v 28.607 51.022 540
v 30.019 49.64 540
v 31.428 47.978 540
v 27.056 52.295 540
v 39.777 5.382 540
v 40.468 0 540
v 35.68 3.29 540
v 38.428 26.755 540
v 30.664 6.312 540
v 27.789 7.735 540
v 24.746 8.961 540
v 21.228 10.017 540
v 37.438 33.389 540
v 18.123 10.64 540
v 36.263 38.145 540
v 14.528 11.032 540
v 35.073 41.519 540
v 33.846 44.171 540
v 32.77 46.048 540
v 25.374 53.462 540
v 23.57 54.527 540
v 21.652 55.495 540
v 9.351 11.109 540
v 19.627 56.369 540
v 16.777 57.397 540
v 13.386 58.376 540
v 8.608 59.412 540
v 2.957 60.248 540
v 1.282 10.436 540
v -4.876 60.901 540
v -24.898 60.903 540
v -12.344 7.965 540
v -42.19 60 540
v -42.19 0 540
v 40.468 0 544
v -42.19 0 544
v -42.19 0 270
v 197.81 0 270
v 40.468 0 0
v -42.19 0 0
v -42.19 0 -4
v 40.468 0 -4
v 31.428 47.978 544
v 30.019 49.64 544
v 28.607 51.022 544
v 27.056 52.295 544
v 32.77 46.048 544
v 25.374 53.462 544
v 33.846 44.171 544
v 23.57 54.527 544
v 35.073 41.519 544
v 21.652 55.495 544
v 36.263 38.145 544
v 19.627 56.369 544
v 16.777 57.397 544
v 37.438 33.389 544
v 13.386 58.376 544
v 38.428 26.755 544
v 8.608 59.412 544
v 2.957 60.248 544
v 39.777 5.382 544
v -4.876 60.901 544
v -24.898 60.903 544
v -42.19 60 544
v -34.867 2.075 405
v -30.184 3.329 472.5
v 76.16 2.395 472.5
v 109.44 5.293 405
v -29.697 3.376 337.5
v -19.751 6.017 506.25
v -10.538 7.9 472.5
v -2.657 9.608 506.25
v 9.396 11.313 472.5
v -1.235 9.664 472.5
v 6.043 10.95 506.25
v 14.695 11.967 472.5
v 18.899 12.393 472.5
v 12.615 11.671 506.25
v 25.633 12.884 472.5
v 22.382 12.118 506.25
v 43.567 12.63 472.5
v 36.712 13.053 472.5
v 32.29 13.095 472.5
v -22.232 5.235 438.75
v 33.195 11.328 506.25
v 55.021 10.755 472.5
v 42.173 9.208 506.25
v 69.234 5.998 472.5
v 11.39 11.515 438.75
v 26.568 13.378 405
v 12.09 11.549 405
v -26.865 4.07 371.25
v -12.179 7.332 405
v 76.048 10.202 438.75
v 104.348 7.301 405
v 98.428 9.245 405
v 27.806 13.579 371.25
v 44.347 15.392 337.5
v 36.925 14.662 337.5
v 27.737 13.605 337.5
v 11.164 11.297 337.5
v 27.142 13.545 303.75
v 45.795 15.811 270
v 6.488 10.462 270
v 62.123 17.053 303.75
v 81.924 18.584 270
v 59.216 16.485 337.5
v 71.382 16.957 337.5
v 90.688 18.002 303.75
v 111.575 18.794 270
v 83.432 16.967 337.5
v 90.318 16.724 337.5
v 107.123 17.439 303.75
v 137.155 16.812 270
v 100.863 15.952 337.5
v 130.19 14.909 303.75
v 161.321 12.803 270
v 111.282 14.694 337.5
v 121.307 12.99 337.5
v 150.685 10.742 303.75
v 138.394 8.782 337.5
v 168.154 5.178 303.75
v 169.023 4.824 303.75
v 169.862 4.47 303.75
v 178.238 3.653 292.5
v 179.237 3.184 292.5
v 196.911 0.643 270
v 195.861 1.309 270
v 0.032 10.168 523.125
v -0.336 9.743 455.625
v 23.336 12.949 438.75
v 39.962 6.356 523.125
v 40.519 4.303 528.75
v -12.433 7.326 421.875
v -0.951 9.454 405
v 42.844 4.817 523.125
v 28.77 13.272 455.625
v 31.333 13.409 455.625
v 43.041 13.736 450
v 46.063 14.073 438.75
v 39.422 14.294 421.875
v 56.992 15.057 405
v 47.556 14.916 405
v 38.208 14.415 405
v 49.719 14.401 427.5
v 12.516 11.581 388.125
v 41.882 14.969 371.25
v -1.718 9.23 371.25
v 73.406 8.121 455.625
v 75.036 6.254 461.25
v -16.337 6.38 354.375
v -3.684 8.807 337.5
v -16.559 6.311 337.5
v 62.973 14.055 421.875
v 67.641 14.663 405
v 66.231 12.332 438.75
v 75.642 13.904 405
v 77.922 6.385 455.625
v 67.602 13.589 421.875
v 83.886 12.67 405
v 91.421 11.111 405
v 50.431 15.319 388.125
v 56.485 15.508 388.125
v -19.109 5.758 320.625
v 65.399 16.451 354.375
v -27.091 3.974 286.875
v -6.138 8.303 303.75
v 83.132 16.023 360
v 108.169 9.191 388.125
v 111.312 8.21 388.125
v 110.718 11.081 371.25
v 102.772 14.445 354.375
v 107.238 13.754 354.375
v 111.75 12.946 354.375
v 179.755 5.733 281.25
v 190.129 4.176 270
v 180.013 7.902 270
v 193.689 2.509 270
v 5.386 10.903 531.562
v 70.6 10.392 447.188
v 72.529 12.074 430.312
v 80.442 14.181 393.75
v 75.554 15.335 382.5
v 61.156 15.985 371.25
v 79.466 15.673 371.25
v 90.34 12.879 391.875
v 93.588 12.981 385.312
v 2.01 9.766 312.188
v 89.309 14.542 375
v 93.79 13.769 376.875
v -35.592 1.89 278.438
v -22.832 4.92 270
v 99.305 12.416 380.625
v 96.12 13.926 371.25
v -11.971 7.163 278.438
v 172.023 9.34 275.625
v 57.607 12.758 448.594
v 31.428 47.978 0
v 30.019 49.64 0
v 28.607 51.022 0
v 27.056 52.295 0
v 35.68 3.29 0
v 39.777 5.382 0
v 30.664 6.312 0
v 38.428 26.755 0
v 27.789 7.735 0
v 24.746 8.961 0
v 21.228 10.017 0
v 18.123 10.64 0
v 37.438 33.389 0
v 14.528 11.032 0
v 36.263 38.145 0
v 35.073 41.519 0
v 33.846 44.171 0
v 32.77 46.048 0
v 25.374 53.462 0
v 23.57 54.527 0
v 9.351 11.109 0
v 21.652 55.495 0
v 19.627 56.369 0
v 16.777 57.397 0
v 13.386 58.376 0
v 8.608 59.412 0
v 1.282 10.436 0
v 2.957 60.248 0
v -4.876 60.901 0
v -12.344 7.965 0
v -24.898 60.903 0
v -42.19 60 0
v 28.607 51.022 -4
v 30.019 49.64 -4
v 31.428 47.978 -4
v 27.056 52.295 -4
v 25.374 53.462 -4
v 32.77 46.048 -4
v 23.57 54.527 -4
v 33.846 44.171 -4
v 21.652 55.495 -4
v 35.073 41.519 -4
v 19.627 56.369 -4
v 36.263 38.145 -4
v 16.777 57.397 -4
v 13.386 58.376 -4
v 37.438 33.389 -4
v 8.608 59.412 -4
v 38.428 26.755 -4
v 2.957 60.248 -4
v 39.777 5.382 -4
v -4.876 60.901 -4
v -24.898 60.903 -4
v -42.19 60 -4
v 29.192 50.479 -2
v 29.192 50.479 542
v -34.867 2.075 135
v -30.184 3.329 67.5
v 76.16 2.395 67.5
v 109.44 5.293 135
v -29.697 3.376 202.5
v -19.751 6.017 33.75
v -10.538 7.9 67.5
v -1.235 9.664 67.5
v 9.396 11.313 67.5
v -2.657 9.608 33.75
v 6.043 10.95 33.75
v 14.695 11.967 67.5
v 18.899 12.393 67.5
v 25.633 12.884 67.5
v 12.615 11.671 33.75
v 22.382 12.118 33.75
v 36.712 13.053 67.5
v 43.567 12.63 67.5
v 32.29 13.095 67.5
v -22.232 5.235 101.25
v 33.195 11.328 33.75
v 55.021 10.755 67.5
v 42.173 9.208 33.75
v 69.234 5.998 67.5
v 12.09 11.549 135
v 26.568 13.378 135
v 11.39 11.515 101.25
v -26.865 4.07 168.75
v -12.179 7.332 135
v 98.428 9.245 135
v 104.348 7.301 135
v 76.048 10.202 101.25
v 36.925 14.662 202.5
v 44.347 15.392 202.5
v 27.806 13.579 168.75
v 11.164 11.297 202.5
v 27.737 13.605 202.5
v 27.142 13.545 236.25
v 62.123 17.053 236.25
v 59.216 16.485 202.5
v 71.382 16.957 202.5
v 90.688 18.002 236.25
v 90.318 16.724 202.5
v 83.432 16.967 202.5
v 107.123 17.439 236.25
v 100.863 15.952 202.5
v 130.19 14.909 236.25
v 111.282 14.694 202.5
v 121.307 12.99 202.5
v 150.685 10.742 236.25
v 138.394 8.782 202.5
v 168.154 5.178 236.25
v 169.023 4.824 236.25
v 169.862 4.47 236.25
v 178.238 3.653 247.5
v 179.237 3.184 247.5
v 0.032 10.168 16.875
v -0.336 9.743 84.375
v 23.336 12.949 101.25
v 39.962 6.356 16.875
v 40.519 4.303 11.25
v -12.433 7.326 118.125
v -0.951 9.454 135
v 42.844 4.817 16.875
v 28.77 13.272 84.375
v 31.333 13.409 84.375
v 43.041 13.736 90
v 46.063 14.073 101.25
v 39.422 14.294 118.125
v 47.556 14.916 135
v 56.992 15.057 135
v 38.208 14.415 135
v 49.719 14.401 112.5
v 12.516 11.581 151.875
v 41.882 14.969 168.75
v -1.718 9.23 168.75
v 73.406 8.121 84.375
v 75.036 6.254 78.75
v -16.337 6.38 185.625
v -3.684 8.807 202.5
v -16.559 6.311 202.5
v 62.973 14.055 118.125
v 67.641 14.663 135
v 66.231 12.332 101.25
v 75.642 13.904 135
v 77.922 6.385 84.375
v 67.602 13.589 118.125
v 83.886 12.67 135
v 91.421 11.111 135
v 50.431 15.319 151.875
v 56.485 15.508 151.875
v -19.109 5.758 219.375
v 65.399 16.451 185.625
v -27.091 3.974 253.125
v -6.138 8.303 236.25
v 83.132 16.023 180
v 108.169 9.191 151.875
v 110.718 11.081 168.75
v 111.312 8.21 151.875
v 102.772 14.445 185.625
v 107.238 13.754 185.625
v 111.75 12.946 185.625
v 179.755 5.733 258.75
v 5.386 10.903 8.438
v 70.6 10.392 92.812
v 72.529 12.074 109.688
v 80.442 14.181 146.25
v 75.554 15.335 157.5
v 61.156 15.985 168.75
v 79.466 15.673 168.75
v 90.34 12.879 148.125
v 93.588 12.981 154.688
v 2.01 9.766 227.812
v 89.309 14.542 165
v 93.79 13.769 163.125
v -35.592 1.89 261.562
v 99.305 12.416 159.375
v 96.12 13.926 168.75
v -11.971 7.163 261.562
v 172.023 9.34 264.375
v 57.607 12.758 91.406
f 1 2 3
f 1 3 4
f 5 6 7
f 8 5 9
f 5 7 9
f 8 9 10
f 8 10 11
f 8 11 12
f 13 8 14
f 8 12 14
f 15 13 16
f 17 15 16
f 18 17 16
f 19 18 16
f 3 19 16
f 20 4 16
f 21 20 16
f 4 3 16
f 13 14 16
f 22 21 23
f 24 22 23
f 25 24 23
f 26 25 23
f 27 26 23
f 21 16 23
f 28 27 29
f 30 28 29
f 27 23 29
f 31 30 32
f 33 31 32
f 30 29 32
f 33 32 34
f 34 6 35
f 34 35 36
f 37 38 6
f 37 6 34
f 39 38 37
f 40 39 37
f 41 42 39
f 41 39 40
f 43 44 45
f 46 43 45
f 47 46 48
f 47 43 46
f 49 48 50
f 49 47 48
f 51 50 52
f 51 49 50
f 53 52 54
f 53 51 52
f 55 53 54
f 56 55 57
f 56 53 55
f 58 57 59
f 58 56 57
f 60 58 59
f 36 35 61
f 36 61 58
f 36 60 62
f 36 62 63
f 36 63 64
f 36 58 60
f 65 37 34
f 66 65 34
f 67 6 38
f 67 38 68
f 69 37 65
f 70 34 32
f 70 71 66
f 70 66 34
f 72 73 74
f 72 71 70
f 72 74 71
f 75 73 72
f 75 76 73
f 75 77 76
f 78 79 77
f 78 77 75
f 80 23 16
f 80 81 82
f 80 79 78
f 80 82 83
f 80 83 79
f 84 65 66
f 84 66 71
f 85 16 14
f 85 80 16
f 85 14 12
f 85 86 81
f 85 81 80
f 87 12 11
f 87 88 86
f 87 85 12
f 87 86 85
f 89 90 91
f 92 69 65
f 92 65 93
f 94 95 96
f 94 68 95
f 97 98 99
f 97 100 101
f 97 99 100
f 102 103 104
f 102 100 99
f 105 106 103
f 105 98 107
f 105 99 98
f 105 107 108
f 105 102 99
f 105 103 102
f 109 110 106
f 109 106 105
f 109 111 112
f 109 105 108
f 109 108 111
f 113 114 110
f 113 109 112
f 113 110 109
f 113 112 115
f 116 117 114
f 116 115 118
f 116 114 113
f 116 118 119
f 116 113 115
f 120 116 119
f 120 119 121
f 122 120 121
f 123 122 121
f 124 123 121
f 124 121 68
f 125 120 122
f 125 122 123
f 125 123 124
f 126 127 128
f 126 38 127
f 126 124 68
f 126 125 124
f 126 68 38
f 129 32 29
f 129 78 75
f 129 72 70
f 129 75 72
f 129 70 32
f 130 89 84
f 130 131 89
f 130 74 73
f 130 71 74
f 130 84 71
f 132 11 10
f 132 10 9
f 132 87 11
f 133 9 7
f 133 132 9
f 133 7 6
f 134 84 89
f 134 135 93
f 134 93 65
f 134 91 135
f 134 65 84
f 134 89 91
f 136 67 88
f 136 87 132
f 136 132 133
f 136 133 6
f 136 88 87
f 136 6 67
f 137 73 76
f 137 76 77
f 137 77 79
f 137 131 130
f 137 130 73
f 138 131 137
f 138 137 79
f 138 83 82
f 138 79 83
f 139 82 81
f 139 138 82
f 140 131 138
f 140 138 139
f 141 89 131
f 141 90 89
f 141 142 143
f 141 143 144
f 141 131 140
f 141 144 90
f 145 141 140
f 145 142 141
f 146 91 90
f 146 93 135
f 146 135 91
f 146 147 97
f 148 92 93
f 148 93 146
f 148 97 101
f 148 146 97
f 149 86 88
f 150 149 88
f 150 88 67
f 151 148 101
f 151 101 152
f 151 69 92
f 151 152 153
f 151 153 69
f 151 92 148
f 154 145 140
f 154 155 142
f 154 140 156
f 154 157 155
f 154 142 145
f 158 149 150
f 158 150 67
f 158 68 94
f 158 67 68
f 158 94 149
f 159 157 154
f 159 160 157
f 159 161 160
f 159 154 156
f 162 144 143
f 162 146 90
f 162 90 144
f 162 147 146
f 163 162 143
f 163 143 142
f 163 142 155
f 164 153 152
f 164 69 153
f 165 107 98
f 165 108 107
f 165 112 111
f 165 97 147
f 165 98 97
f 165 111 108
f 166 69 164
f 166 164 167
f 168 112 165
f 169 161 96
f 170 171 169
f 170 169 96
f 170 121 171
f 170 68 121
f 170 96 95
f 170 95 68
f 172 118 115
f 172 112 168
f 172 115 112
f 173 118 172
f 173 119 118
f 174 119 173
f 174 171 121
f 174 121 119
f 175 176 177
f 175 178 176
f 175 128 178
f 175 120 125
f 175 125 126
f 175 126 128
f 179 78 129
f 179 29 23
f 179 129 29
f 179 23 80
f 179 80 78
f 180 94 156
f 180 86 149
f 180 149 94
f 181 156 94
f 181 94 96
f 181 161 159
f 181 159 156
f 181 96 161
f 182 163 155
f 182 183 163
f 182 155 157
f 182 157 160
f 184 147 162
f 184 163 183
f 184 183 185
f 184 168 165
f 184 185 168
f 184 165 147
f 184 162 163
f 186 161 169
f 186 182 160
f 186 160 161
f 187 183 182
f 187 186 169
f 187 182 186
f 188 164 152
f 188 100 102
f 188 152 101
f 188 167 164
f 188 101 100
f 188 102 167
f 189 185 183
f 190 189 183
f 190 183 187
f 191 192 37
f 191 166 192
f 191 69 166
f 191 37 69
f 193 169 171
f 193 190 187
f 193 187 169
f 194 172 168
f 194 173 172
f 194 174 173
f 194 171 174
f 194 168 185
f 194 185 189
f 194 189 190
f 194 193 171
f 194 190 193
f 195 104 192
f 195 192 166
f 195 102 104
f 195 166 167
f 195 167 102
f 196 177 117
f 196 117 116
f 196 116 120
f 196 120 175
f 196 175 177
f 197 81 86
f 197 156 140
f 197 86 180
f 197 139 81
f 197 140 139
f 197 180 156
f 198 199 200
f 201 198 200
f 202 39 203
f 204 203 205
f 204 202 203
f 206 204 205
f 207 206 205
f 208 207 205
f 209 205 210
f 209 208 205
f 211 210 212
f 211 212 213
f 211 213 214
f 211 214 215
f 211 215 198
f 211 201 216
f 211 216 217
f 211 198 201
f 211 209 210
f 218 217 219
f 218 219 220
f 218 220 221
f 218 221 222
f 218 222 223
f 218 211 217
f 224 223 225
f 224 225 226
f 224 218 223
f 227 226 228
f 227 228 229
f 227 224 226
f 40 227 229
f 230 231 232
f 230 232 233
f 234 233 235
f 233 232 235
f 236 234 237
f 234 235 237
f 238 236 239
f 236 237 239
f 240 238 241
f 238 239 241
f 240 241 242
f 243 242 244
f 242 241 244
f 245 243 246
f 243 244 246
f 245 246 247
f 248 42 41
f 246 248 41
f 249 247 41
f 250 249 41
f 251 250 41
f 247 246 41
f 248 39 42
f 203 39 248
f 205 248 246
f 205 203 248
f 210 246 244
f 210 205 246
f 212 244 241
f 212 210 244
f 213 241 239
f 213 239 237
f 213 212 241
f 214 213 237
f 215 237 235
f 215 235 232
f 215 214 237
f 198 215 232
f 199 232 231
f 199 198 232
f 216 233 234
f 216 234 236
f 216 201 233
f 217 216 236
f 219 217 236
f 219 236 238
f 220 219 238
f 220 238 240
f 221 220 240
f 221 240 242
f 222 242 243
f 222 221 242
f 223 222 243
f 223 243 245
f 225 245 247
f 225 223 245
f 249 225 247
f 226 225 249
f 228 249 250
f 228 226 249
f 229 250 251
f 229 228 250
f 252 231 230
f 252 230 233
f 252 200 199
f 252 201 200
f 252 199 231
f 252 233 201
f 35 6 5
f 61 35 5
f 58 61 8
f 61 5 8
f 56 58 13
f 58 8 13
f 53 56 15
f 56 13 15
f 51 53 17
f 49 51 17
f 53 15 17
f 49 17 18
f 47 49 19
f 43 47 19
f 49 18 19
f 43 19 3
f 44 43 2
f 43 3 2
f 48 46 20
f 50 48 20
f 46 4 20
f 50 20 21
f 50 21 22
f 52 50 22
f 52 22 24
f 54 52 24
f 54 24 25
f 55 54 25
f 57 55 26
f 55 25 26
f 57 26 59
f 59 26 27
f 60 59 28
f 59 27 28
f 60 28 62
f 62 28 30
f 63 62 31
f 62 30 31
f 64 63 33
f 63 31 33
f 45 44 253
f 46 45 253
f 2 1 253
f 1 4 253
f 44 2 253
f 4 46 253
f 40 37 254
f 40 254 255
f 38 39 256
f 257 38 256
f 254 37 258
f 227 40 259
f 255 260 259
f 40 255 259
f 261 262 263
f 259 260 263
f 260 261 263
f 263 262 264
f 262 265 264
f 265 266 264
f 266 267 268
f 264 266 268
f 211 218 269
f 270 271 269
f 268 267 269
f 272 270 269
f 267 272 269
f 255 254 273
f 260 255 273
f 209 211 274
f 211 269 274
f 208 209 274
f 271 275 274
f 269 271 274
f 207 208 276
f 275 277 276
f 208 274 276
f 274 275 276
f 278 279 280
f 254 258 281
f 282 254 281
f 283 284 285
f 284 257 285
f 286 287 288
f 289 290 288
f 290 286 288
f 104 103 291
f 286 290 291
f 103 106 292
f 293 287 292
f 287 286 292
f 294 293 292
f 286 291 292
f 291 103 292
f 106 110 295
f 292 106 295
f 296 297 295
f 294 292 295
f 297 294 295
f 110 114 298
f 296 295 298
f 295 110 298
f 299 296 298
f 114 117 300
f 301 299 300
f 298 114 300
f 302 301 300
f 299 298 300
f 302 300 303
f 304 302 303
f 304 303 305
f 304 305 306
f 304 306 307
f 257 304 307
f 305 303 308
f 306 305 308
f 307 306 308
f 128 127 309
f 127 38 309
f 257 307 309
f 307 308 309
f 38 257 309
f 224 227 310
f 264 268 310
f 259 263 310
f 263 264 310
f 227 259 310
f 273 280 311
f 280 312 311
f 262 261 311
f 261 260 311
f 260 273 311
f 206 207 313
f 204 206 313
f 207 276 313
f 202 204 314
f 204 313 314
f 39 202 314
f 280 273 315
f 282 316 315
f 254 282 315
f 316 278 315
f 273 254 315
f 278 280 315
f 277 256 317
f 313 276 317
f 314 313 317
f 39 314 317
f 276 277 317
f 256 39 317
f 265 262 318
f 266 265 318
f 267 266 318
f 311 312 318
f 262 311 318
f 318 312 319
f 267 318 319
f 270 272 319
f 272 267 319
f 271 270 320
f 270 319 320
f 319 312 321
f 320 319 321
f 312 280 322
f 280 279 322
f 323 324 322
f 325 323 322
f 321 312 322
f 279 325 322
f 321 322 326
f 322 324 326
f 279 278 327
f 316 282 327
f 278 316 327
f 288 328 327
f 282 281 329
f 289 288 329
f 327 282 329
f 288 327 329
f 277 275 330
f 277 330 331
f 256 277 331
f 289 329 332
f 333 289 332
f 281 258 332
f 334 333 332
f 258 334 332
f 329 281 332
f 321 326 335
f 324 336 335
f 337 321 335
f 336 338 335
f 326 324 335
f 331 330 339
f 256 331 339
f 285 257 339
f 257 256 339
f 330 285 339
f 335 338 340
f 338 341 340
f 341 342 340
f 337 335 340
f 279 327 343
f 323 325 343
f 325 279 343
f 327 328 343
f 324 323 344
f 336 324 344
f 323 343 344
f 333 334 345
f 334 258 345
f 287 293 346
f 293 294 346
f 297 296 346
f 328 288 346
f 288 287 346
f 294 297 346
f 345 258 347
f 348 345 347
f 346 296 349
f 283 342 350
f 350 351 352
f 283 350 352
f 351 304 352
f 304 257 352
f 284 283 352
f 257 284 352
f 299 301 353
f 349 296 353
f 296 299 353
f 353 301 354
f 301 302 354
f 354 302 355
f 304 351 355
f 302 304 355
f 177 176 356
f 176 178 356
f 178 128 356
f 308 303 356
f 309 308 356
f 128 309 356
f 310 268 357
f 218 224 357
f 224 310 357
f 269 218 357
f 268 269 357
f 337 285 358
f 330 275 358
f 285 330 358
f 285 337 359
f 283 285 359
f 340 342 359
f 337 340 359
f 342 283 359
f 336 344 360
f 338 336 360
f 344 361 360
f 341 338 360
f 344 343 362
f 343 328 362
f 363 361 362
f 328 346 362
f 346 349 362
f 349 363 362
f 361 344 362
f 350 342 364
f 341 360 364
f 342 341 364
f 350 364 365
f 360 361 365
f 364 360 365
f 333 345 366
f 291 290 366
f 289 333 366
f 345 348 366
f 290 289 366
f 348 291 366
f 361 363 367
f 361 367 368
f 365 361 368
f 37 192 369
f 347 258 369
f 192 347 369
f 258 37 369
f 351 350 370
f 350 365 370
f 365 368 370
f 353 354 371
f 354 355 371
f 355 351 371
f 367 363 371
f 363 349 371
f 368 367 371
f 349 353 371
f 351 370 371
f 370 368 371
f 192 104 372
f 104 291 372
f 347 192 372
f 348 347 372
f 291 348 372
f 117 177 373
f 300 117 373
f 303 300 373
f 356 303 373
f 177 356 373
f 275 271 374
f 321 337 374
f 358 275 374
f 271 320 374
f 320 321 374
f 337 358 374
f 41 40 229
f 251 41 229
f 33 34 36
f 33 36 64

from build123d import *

# Parameters (mm, degrees)
F7_DEPTH = 4


with BuildPart() as f5:
    # F2 (on Top) → F5 section 0
    with BuildSketch(Plane.XY):
        with BuildLine():
            add(Edge.make_bspline(
                [(-42.1898663044, 0), (-20.095104951, 6.3461639408), (16.4689935563, 16.848280699), (33.6635201253, 4.7769359586), (40.4678285122, 0)],
                knots=[0, 0, 0, 0, 0.6042747464, 1, 1, 1, 1], degree=3))
            Line((-42.1898663044, 0), (40.4678285122, 0))
        make_face()
    # F4 (on offset) → F5 section 1
    with BuildSketch(Plane.XY.offset(270)):
        with BuildLine():
            add(Edge.make_bspline(
                [(-42.1898663044, 0), (-20.9629036859, 6.7867963825), (110.2383227264, 31.3871603736), (189.1823338107, 6.6216905533), (197.8101336956, 0)],
                knots=[0, 0, 0, 0, 0.5699540347, 1, 1, 1, 1], degree=3))
            Line((-42.1898663044, 0), (197.8101336956, 0))
        make_face()
    loft()

    # F6 (on face) → F7 (join)
    with BuildSketch(Plane(origin=(0, 0, 0), x_dir=(1, 0, 0), z_dir=(0, 0, -1))):
        with BuildLine():
            add(Edge.make_bspline(
                [(40.4678285122, 0), (37.8826727608, -14.0204940933), (45.9325195, -67.5326493396), (-22.4150604159, -60.996185377), (-42.1898663044, -60)],
                knots=[0, 0, 0, 0, 0.4587258224, 1, 1, 1, 1], degree=3))
            Line((40.4678285122, 0), (-42.1898663044, 0))
            Line((-42.1898663044, 0), (-42.1898663044, -60))
        make_face()
    extrude(amount=F7_DEPTH)

    # F8: F5 across face


with BuildPart() as f5_1:
    add(f5.part)
    add(f5.part.mirror(Plane(origin=(85.8641490602, 7.5856772393, 270), x_dir=(1, 0, 0), z_dir=(0, 0, 1))))


solid = f5_1.part
